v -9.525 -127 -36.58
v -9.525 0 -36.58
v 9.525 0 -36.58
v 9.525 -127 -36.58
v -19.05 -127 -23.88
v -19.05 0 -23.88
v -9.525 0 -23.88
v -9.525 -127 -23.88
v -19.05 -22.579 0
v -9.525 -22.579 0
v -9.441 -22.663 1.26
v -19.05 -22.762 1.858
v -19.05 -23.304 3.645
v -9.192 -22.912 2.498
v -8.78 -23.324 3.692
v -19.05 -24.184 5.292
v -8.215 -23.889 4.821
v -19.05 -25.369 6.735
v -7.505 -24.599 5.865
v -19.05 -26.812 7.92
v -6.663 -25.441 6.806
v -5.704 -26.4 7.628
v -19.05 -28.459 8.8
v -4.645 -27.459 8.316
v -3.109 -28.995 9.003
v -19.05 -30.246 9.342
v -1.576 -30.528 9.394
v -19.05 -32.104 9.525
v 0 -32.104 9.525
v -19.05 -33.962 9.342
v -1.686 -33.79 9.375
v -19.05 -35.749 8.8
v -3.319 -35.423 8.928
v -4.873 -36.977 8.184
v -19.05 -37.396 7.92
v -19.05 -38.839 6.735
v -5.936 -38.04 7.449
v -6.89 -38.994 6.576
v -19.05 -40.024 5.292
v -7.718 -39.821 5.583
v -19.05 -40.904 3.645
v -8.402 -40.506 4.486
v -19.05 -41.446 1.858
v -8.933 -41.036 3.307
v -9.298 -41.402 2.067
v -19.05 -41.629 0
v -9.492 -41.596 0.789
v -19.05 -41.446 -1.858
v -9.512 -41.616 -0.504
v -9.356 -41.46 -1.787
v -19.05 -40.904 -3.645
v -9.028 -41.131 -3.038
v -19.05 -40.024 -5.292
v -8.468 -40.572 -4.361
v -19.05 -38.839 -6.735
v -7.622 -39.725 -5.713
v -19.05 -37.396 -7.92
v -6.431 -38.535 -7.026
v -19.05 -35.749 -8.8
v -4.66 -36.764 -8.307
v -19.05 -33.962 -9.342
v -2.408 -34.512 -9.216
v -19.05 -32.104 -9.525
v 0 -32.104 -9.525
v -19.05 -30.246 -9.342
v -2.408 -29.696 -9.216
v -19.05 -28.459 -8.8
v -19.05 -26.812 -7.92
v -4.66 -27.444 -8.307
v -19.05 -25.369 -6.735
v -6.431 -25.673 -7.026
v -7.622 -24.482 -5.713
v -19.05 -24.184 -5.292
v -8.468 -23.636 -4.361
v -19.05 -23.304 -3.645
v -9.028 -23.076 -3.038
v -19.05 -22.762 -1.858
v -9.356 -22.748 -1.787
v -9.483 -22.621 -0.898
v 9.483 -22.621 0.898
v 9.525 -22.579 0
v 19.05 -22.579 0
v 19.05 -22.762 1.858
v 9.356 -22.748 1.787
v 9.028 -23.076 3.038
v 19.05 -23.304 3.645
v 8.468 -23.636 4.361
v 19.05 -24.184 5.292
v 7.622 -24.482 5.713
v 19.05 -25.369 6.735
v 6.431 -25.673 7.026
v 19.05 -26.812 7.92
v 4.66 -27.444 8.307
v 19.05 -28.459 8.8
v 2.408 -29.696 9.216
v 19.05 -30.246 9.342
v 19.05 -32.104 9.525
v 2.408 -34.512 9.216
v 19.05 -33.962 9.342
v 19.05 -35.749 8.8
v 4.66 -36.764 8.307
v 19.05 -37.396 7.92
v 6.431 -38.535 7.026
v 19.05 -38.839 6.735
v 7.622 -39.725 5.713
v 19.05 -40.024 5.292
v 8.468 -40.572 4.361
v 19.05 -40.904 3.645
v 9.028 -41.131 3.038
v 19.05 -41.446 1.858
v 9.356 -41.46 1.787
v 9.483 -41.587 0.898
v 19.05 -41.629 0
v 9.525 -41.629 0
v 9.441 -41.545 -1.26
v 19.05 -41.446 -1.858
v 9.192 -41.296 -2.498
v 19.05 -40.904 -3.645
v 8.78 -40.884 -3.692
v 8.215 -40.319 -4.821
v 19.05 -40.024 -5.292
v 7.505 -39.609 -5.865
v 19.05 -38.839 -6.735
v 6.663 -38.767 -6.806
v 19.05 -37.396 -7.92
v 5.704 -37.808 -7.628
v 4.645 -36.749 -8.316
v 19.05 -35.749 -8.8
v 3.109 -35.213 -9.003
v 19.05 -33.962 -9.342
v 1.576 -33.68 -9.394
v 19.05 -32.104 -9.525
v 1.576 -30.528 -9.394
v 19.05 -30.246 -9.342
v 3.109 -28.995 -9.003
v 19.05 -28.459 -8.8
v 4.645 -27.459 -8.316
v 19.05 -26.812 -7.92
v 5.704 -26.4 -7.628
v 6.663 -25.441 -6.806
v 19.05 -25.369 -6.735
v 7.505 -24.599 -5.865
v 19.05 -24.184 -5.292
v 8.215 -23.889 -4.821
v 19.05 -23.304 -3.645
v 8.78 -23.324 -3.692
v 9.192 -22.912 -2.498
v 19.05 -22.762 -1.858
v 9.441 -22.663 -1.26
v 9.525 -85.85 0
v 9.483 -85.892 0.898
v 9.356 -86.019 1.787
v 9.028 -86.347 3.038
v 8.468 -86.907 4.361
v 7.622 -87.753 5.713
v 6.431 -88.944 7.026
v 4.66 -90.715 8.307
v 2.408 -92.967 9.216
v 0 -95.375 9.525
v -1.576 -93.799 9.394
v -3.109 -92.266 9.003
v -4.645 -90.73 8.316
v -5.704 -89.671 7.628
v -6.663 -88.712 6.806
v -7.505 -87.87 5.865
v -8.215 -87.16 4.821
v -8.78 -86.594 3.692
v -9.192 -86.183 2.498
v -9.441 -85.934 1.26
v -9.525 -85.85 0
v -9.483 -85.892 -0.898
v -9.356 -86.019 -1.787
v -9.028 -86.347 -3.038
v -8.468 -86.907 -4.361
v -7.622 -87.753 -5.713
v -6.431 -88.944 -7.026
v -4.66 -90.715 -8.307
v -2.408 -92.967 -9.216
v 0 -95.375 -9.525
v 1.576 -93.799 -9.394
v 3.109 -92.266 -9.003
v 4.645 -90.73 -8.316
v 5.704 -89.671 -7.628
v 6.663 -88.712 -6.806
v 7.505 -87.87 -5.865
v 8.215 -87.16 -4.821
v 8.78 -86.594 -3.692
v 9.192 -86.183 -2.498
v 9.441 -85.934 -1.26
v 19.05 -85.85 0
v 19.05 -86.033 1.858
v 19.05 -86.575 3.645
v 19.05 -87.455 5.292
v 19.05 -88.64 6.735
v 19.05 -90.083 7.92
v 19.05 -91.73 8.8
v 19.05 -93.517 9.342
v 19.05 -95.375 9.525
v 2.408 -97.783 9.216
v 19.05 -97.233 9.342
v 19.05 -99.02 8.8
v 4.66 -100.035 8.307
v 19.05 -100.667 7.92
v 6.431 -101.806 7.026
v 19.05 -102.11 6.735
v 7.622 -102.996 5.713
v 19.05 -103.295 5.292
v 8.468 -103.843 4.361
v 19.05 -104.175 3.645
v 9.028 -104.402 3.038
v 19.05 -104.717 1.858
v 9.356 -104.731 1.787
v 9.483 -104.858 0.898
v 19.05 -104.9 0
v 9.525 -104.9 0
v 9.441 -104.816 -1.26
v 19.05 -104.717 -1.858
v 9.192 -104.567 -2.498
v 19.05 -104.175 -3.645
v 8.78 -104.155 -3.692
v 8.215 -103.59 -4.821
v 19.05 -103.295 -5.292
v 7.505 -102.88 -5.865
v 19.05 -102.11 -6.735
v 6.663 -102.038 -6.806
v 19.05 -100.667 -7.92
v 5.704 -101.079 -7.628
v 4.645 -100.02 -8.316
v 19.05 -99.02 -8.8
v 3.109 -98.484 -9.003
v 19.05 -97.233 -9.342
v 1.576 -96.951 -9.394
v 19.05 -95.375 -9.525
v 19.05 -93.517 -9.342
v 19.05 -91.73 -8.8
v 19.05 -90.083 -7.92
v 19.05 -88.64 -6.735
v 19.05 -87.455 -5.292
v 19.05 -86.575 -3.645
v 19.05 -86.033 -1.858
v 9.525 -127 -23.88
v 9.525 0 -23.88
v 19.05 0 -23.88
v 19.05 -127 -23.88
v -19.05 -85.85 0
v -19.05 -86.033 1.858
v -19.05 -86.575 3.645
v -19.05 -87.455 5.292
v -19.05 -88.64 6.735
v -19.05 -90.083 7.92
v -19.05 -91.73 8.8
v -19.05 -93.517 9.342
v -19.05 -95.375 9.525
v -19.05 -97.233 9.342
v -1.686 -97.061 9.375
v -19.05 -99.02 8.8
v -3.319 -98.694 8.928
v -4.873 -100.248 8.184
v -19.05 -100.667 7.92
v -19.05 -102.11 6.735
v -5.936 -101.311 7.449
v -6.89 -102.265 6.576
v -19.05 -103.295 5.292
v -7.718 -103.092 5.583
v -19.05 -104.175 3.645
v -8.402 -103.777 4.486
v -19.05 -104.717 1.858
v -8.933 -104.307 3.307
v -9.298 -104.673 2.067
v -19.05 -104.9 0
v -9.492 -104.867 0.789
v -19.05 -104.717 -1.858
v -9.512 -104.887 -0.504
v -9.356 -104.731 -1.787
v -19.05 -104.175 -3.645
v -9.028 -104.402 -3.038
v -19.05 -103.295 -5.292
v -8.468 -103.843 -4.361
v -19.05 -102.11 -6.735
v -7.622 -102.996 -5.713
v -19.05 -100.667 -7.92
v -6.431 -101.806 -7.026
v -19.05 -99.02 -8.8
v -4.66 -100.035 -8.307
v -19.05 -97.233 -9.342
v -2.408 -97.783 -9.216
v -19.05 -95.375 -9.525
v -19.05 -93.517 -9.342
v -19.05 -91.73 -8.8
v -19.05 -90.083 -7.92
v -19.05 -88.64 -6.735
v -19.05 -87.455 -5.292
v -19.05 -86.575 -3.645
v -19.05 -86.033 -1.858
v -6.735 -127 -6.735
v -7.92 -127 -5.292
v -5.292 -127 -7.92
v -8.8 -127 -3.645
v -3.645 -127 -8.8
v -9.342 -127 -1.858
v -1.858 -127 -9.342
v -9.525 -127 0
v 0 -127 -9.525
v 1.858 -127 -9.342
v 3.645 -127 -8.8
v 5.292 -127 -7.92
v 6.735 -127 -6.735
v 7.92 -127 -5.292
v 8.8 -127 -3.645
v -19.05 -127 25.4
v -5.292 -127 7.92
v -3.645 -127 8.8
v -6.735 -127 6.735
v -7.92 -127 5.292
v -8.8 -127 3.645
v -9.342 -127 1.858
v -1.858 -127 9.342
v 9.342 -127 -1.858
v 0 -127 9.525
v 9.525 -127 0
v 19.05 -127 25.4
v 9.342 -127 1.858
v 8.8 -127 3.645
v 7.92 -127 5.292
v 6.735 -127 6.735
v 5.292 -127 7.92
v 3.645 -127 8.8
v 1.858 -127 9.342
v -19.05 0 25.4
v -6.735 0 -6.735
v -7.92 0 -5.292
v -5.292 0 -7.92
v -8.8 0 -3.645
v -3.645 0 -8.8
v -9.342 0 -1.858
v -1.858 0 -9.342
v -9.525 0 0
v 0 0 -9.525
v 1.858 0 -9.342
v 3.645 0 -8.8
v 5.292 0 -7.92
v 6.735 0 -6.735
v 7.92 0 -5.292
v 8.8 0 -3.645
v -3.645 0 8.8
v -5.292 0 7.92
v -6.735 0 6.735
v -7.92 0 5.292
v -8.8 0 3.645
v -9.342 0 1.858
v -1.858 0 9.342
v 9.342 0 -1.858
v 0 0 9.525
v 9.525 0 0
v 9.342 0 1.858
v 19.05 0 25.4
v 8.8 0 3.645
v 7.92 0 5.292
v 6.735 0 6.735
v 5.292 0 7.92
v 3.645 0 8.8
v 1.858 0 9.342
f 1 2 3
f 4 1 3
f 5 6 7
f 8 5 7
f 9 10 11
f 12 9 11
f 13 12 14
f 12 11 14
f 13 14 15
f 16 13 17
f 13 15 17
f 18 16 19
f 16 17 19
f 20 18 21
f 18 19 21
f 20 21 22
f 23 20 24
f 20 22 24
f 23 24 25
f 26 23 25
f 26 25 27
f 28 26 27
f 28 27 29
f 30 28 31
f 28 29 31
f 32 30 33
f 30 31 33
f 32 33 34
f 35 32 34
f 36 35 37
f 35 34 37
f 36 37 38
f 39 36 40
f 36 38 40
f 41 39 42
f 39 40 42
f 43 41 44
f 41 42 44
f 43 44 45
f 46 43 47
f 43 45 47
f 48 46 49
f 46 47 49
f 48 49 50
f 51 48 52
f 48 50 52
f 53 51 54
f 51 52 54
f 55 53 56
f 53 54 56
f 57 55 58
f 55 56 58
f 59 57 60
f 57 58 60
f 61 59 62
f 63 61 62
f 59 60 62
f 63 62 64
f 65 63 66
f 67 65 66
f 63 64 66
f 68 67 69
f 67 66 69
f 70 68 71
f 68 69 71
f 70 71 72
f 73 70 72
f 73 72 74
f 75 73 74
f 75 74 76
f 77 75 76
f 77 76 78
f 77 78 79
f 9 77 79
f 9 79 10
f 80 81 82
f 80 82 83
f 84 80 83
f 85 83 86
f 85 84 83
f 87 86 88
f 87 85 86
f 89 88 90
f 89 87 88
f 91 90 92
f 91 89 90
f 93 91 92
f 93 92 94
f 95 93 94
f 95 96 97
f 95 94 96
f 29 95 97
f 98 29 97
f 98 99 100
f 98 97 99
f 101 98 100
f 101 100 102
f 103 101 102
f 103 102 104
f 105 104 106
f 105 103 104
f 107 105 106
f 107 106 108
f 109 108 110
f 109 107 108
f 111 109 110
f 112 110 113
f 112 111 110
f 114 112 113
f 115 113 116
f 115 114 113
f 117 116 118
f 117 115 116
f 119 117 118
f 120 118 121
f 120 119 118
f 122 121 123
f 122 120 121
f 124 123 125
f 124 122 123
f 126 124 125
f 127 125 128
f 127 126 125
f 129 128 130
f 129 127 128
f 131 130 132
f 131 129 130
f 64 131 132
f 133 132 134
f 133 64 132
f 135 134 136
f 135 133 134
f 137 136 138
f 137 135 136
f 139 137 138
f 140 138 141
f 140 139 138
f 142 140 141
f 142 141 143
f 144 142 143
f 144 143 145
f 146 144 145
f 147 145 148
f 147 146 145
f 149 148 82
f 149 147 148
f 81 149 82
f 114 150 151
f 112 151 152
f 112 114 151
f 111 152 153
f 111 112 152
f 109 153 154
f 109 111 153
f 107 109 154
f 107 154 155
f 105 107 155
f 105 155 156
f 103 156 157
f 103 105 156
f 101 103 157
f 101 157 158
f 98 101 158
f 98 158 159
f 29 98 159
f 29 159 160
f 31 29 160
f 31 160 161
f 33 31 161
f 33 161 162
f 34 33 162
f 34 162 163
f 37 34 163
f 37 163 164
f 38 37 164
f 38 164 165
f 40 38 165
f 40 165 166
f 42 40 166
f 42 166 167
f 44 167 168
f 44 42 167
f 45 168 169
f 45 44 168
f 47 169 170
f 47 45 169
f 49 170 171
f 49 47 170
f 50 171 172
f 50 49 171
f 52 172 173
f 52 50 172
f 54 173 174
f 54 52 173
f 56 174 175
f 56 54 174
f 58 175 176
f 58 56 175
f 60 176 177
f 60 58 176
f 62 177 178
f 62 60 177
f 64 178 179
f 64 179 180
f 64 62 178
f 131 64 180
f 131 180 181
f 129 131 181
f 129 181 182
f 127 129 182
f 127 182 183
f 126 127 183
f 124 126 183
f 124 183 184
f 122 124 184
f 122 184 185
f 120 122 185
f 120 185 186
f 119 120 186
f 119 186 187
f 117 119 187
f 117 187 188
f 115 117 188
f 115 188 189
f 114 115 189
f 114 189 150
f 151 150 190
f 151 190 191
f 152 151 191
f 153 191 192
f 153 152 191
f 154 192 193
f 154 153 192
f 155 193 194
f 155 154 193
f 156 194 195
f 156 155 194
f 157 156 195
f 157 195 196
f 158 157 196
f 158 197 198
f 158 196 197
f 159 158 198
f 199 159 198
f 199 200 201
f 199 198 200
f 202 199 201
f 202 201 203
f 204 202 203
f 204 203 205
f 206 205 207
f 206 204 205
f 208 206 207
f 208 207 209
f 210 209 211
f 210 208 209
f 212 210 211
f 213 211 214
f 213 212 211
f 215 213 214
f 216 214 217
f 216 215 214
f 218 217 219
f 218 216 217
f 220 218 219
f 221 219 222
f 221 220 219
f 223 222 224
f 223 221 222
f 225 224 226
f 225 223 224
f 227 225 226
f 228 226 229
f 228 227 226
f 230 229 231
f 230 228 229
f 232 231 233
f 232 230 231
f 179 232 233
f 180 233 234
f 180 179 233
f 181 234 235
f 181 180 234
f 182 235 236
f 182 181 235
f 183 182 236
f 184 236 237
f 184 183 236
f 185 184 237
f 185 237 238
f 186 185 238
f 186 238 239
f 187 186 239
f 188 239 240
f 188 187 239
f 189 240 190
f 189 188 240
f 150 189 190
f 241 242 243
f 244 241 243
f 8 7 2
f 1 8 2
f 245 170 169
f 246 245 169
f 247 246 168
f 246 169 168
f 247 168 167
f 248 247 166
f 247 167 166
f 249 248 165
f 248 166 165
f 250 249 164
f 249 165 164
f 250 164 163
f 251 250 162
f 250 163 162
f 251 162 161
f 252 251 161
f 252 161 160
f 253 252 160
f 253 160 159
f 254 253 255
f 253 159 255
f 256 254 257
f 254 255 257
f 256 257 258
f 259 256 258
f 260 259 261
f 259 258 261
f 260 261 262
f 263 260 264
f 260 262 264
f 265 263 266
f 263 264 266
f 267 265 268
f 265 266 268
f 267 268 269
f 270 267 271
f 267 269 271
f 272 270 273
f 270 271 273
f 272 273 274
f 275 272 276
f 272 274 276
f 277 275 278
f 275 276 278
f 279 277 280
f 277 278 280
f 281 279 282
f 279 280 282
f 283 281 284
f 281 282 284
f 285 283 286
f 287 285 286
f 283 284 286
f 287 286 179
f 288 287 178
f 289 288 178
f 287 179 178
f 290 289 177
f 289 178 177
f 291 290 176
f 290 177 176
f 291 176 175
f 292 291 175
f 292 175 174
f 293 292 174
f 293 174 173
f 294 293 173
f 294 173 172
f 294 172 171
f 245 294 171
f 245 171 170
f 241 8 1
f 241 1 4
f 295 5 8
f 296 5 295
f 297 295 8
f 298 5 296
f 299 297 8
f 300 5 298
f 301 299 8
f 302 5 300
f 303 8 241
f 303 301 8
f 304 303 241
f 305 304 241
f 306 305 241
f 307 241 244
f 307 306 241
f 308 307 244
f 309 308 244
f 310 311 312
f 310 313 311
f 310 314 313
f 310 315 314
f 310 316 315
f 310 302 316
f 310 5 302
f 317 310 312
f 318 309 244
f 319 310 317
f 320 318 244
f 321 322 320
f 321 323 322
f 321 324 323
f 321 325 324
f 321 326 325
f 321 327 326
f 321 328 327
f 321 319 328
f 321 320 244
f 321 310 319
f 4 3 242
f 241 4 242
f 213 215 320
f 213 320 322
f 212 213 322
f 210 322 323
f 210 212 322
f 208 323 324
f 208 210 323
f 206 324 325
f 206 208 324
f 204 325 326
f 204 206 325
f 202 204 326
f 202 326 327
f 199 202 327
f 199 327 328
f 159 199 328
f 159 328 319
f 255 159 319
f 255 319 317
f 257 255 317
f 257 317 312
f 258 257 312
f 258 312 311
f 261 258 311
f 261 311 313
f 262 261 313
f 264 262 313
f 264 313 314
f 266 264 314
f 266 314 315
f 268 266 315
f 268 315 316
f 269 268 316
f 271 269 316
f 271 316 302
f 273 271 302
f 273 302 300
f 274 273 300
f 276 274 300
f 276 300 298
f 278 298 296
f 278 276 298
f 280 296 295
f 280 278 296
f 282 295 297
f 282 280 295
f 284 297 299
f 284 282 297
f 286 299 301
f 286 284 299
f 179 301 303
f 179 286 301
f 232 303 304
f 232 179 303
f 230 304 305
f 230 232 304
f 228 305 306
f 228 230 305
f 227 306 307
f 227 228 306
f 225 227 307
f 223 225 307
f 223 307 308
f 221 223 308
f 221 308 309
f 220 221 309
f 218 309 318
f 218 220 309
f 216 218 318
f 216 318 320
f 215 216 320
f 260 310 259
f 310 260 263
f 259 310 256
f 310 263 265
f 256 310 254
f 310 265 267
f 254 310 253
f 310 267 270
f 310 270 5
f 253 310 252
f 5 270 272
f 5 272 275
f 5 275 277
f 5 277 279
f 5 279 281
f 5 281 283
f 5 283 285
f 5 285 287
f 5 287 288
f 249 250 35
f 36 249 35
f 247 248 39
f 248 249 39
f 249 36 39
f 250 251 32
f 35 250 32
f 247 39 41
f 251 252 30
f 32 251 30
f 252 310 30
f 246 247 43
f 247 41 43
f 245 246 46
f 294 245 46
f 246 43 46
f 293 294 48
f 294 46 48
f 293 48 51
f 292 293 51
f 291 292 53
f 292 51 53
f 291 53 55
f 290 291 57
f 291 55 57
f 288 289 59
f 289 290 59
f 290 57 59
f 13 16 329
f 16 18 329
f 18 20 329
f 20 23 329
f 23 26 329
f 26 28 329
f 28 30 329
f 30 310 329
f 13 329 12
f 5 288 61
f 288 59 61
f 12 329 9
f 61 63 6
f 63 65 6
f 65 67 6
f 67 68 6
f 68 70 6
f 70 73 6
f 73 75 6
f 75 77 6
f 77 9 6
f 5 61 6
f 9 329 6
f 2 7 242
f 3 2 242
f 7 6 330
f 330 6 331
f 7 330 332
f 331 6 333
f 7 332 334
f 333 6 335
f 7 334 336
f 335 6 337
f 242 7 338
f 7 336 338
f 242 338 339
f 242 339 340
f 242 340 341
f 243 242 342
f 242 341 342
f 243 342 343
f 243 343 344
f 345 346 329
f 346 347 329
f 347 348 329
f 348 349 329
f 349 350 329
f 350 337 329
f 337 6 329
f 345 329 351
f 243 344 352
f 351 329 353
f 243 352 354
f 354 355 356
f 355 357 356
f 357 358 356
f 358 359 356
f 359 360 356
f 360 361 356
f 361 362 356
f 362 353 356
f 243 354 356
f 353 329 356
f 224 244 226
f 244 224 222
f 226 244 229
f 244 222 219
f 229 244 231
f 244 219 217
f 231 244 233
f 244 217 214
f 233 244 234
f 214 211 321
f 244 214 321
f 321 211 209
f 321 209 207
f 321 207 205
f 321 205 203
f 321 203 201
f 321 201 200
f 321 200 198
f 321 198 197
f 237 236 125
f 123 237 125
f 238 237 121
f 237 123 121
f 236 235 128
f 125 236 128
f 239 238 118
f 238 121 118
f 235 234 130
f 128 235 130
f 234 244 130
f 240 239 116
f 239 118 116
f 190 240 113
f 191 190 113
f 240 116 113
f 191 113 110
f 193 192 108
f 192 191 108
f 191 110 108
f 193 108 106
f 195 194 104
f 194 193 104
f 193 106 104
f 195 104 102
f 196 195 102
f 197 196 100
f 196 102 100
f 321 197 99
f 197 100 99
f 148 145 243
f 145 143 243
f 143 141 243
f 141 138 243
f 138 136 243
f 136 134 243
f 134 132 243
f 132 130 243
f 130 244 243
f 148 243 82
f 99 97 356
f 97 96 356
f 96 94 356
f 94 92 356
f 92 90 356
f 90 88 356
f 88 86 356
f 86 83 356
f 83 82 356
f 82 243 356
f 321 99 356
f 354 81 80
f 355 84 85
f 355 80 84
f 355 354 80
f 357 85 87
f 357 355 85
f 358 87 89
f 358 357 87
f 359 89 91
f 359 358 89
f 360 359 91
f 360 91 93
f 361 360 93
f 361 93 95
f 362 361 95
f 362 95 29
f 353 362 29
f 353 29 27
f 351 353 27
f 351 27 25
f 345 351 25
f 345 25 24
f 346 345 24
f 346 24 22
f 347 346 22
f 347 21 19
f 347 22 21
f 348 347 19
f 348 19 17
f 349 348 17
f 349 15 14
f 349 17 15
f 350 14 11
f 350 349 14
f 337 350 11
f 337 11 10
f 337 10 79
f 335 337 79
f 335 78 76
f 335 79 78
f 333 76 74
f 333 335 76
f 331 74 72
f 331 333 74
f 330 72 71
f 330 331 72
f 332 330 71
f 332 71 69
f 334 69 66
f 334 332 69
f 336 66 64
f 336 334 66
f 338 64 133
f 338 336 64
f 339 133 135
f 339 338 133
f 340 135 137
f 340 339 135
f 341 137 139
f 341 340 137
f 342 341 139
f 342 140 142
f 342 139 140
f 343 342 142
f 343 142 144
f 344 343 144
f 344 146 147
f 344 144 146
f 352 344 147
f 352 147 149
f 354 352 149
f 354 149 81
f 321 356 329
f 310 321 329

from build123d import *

# Parameters (mm, degrees)
F0_R          = 9.525
F1_DEPTH      = 127
F2_R          = 9.525
F3_DEPTH      = 38.1
F3_DEPTH_BACK = 38.1


with BuildPart() as f1:
    # F0 (on Front) → F1 (new body)
    with BuildSketch(Plane.XZ):
        Polygon((-9.525, -23.880164), (-9.525, -36.580164), (9.525, -36.580164), (9.525, -23.880164), (19.05, -23.880164), (19.05, 0), (19.05, 25.4), (0, 25.4), (-19.05, 25.4), (-19.05, 0), (-19.05, -23.880164), align=None)
        Circle(F0_R, mode=Mode.SUBTRACT)
    extrude(amount=F1_DEPTH)

    # F2 (on Right) → F3 (cut, two sides)
    with BuildSketch(Plane.YZ) as f3_sk:
        with Locations((-32.103937, 0)):
            Circle(F2_R)
        with Locations((-95.37492, 0)):
            Circle(F2_R)
    extrude(amount=F3_DEPTH, mode=Mode.SUBTRACT)
    extrude(f3_sk.sketch, amount=-F3_DEPTH_BACK, mode=Mode.SUBTRACT)


solid = f1.part
